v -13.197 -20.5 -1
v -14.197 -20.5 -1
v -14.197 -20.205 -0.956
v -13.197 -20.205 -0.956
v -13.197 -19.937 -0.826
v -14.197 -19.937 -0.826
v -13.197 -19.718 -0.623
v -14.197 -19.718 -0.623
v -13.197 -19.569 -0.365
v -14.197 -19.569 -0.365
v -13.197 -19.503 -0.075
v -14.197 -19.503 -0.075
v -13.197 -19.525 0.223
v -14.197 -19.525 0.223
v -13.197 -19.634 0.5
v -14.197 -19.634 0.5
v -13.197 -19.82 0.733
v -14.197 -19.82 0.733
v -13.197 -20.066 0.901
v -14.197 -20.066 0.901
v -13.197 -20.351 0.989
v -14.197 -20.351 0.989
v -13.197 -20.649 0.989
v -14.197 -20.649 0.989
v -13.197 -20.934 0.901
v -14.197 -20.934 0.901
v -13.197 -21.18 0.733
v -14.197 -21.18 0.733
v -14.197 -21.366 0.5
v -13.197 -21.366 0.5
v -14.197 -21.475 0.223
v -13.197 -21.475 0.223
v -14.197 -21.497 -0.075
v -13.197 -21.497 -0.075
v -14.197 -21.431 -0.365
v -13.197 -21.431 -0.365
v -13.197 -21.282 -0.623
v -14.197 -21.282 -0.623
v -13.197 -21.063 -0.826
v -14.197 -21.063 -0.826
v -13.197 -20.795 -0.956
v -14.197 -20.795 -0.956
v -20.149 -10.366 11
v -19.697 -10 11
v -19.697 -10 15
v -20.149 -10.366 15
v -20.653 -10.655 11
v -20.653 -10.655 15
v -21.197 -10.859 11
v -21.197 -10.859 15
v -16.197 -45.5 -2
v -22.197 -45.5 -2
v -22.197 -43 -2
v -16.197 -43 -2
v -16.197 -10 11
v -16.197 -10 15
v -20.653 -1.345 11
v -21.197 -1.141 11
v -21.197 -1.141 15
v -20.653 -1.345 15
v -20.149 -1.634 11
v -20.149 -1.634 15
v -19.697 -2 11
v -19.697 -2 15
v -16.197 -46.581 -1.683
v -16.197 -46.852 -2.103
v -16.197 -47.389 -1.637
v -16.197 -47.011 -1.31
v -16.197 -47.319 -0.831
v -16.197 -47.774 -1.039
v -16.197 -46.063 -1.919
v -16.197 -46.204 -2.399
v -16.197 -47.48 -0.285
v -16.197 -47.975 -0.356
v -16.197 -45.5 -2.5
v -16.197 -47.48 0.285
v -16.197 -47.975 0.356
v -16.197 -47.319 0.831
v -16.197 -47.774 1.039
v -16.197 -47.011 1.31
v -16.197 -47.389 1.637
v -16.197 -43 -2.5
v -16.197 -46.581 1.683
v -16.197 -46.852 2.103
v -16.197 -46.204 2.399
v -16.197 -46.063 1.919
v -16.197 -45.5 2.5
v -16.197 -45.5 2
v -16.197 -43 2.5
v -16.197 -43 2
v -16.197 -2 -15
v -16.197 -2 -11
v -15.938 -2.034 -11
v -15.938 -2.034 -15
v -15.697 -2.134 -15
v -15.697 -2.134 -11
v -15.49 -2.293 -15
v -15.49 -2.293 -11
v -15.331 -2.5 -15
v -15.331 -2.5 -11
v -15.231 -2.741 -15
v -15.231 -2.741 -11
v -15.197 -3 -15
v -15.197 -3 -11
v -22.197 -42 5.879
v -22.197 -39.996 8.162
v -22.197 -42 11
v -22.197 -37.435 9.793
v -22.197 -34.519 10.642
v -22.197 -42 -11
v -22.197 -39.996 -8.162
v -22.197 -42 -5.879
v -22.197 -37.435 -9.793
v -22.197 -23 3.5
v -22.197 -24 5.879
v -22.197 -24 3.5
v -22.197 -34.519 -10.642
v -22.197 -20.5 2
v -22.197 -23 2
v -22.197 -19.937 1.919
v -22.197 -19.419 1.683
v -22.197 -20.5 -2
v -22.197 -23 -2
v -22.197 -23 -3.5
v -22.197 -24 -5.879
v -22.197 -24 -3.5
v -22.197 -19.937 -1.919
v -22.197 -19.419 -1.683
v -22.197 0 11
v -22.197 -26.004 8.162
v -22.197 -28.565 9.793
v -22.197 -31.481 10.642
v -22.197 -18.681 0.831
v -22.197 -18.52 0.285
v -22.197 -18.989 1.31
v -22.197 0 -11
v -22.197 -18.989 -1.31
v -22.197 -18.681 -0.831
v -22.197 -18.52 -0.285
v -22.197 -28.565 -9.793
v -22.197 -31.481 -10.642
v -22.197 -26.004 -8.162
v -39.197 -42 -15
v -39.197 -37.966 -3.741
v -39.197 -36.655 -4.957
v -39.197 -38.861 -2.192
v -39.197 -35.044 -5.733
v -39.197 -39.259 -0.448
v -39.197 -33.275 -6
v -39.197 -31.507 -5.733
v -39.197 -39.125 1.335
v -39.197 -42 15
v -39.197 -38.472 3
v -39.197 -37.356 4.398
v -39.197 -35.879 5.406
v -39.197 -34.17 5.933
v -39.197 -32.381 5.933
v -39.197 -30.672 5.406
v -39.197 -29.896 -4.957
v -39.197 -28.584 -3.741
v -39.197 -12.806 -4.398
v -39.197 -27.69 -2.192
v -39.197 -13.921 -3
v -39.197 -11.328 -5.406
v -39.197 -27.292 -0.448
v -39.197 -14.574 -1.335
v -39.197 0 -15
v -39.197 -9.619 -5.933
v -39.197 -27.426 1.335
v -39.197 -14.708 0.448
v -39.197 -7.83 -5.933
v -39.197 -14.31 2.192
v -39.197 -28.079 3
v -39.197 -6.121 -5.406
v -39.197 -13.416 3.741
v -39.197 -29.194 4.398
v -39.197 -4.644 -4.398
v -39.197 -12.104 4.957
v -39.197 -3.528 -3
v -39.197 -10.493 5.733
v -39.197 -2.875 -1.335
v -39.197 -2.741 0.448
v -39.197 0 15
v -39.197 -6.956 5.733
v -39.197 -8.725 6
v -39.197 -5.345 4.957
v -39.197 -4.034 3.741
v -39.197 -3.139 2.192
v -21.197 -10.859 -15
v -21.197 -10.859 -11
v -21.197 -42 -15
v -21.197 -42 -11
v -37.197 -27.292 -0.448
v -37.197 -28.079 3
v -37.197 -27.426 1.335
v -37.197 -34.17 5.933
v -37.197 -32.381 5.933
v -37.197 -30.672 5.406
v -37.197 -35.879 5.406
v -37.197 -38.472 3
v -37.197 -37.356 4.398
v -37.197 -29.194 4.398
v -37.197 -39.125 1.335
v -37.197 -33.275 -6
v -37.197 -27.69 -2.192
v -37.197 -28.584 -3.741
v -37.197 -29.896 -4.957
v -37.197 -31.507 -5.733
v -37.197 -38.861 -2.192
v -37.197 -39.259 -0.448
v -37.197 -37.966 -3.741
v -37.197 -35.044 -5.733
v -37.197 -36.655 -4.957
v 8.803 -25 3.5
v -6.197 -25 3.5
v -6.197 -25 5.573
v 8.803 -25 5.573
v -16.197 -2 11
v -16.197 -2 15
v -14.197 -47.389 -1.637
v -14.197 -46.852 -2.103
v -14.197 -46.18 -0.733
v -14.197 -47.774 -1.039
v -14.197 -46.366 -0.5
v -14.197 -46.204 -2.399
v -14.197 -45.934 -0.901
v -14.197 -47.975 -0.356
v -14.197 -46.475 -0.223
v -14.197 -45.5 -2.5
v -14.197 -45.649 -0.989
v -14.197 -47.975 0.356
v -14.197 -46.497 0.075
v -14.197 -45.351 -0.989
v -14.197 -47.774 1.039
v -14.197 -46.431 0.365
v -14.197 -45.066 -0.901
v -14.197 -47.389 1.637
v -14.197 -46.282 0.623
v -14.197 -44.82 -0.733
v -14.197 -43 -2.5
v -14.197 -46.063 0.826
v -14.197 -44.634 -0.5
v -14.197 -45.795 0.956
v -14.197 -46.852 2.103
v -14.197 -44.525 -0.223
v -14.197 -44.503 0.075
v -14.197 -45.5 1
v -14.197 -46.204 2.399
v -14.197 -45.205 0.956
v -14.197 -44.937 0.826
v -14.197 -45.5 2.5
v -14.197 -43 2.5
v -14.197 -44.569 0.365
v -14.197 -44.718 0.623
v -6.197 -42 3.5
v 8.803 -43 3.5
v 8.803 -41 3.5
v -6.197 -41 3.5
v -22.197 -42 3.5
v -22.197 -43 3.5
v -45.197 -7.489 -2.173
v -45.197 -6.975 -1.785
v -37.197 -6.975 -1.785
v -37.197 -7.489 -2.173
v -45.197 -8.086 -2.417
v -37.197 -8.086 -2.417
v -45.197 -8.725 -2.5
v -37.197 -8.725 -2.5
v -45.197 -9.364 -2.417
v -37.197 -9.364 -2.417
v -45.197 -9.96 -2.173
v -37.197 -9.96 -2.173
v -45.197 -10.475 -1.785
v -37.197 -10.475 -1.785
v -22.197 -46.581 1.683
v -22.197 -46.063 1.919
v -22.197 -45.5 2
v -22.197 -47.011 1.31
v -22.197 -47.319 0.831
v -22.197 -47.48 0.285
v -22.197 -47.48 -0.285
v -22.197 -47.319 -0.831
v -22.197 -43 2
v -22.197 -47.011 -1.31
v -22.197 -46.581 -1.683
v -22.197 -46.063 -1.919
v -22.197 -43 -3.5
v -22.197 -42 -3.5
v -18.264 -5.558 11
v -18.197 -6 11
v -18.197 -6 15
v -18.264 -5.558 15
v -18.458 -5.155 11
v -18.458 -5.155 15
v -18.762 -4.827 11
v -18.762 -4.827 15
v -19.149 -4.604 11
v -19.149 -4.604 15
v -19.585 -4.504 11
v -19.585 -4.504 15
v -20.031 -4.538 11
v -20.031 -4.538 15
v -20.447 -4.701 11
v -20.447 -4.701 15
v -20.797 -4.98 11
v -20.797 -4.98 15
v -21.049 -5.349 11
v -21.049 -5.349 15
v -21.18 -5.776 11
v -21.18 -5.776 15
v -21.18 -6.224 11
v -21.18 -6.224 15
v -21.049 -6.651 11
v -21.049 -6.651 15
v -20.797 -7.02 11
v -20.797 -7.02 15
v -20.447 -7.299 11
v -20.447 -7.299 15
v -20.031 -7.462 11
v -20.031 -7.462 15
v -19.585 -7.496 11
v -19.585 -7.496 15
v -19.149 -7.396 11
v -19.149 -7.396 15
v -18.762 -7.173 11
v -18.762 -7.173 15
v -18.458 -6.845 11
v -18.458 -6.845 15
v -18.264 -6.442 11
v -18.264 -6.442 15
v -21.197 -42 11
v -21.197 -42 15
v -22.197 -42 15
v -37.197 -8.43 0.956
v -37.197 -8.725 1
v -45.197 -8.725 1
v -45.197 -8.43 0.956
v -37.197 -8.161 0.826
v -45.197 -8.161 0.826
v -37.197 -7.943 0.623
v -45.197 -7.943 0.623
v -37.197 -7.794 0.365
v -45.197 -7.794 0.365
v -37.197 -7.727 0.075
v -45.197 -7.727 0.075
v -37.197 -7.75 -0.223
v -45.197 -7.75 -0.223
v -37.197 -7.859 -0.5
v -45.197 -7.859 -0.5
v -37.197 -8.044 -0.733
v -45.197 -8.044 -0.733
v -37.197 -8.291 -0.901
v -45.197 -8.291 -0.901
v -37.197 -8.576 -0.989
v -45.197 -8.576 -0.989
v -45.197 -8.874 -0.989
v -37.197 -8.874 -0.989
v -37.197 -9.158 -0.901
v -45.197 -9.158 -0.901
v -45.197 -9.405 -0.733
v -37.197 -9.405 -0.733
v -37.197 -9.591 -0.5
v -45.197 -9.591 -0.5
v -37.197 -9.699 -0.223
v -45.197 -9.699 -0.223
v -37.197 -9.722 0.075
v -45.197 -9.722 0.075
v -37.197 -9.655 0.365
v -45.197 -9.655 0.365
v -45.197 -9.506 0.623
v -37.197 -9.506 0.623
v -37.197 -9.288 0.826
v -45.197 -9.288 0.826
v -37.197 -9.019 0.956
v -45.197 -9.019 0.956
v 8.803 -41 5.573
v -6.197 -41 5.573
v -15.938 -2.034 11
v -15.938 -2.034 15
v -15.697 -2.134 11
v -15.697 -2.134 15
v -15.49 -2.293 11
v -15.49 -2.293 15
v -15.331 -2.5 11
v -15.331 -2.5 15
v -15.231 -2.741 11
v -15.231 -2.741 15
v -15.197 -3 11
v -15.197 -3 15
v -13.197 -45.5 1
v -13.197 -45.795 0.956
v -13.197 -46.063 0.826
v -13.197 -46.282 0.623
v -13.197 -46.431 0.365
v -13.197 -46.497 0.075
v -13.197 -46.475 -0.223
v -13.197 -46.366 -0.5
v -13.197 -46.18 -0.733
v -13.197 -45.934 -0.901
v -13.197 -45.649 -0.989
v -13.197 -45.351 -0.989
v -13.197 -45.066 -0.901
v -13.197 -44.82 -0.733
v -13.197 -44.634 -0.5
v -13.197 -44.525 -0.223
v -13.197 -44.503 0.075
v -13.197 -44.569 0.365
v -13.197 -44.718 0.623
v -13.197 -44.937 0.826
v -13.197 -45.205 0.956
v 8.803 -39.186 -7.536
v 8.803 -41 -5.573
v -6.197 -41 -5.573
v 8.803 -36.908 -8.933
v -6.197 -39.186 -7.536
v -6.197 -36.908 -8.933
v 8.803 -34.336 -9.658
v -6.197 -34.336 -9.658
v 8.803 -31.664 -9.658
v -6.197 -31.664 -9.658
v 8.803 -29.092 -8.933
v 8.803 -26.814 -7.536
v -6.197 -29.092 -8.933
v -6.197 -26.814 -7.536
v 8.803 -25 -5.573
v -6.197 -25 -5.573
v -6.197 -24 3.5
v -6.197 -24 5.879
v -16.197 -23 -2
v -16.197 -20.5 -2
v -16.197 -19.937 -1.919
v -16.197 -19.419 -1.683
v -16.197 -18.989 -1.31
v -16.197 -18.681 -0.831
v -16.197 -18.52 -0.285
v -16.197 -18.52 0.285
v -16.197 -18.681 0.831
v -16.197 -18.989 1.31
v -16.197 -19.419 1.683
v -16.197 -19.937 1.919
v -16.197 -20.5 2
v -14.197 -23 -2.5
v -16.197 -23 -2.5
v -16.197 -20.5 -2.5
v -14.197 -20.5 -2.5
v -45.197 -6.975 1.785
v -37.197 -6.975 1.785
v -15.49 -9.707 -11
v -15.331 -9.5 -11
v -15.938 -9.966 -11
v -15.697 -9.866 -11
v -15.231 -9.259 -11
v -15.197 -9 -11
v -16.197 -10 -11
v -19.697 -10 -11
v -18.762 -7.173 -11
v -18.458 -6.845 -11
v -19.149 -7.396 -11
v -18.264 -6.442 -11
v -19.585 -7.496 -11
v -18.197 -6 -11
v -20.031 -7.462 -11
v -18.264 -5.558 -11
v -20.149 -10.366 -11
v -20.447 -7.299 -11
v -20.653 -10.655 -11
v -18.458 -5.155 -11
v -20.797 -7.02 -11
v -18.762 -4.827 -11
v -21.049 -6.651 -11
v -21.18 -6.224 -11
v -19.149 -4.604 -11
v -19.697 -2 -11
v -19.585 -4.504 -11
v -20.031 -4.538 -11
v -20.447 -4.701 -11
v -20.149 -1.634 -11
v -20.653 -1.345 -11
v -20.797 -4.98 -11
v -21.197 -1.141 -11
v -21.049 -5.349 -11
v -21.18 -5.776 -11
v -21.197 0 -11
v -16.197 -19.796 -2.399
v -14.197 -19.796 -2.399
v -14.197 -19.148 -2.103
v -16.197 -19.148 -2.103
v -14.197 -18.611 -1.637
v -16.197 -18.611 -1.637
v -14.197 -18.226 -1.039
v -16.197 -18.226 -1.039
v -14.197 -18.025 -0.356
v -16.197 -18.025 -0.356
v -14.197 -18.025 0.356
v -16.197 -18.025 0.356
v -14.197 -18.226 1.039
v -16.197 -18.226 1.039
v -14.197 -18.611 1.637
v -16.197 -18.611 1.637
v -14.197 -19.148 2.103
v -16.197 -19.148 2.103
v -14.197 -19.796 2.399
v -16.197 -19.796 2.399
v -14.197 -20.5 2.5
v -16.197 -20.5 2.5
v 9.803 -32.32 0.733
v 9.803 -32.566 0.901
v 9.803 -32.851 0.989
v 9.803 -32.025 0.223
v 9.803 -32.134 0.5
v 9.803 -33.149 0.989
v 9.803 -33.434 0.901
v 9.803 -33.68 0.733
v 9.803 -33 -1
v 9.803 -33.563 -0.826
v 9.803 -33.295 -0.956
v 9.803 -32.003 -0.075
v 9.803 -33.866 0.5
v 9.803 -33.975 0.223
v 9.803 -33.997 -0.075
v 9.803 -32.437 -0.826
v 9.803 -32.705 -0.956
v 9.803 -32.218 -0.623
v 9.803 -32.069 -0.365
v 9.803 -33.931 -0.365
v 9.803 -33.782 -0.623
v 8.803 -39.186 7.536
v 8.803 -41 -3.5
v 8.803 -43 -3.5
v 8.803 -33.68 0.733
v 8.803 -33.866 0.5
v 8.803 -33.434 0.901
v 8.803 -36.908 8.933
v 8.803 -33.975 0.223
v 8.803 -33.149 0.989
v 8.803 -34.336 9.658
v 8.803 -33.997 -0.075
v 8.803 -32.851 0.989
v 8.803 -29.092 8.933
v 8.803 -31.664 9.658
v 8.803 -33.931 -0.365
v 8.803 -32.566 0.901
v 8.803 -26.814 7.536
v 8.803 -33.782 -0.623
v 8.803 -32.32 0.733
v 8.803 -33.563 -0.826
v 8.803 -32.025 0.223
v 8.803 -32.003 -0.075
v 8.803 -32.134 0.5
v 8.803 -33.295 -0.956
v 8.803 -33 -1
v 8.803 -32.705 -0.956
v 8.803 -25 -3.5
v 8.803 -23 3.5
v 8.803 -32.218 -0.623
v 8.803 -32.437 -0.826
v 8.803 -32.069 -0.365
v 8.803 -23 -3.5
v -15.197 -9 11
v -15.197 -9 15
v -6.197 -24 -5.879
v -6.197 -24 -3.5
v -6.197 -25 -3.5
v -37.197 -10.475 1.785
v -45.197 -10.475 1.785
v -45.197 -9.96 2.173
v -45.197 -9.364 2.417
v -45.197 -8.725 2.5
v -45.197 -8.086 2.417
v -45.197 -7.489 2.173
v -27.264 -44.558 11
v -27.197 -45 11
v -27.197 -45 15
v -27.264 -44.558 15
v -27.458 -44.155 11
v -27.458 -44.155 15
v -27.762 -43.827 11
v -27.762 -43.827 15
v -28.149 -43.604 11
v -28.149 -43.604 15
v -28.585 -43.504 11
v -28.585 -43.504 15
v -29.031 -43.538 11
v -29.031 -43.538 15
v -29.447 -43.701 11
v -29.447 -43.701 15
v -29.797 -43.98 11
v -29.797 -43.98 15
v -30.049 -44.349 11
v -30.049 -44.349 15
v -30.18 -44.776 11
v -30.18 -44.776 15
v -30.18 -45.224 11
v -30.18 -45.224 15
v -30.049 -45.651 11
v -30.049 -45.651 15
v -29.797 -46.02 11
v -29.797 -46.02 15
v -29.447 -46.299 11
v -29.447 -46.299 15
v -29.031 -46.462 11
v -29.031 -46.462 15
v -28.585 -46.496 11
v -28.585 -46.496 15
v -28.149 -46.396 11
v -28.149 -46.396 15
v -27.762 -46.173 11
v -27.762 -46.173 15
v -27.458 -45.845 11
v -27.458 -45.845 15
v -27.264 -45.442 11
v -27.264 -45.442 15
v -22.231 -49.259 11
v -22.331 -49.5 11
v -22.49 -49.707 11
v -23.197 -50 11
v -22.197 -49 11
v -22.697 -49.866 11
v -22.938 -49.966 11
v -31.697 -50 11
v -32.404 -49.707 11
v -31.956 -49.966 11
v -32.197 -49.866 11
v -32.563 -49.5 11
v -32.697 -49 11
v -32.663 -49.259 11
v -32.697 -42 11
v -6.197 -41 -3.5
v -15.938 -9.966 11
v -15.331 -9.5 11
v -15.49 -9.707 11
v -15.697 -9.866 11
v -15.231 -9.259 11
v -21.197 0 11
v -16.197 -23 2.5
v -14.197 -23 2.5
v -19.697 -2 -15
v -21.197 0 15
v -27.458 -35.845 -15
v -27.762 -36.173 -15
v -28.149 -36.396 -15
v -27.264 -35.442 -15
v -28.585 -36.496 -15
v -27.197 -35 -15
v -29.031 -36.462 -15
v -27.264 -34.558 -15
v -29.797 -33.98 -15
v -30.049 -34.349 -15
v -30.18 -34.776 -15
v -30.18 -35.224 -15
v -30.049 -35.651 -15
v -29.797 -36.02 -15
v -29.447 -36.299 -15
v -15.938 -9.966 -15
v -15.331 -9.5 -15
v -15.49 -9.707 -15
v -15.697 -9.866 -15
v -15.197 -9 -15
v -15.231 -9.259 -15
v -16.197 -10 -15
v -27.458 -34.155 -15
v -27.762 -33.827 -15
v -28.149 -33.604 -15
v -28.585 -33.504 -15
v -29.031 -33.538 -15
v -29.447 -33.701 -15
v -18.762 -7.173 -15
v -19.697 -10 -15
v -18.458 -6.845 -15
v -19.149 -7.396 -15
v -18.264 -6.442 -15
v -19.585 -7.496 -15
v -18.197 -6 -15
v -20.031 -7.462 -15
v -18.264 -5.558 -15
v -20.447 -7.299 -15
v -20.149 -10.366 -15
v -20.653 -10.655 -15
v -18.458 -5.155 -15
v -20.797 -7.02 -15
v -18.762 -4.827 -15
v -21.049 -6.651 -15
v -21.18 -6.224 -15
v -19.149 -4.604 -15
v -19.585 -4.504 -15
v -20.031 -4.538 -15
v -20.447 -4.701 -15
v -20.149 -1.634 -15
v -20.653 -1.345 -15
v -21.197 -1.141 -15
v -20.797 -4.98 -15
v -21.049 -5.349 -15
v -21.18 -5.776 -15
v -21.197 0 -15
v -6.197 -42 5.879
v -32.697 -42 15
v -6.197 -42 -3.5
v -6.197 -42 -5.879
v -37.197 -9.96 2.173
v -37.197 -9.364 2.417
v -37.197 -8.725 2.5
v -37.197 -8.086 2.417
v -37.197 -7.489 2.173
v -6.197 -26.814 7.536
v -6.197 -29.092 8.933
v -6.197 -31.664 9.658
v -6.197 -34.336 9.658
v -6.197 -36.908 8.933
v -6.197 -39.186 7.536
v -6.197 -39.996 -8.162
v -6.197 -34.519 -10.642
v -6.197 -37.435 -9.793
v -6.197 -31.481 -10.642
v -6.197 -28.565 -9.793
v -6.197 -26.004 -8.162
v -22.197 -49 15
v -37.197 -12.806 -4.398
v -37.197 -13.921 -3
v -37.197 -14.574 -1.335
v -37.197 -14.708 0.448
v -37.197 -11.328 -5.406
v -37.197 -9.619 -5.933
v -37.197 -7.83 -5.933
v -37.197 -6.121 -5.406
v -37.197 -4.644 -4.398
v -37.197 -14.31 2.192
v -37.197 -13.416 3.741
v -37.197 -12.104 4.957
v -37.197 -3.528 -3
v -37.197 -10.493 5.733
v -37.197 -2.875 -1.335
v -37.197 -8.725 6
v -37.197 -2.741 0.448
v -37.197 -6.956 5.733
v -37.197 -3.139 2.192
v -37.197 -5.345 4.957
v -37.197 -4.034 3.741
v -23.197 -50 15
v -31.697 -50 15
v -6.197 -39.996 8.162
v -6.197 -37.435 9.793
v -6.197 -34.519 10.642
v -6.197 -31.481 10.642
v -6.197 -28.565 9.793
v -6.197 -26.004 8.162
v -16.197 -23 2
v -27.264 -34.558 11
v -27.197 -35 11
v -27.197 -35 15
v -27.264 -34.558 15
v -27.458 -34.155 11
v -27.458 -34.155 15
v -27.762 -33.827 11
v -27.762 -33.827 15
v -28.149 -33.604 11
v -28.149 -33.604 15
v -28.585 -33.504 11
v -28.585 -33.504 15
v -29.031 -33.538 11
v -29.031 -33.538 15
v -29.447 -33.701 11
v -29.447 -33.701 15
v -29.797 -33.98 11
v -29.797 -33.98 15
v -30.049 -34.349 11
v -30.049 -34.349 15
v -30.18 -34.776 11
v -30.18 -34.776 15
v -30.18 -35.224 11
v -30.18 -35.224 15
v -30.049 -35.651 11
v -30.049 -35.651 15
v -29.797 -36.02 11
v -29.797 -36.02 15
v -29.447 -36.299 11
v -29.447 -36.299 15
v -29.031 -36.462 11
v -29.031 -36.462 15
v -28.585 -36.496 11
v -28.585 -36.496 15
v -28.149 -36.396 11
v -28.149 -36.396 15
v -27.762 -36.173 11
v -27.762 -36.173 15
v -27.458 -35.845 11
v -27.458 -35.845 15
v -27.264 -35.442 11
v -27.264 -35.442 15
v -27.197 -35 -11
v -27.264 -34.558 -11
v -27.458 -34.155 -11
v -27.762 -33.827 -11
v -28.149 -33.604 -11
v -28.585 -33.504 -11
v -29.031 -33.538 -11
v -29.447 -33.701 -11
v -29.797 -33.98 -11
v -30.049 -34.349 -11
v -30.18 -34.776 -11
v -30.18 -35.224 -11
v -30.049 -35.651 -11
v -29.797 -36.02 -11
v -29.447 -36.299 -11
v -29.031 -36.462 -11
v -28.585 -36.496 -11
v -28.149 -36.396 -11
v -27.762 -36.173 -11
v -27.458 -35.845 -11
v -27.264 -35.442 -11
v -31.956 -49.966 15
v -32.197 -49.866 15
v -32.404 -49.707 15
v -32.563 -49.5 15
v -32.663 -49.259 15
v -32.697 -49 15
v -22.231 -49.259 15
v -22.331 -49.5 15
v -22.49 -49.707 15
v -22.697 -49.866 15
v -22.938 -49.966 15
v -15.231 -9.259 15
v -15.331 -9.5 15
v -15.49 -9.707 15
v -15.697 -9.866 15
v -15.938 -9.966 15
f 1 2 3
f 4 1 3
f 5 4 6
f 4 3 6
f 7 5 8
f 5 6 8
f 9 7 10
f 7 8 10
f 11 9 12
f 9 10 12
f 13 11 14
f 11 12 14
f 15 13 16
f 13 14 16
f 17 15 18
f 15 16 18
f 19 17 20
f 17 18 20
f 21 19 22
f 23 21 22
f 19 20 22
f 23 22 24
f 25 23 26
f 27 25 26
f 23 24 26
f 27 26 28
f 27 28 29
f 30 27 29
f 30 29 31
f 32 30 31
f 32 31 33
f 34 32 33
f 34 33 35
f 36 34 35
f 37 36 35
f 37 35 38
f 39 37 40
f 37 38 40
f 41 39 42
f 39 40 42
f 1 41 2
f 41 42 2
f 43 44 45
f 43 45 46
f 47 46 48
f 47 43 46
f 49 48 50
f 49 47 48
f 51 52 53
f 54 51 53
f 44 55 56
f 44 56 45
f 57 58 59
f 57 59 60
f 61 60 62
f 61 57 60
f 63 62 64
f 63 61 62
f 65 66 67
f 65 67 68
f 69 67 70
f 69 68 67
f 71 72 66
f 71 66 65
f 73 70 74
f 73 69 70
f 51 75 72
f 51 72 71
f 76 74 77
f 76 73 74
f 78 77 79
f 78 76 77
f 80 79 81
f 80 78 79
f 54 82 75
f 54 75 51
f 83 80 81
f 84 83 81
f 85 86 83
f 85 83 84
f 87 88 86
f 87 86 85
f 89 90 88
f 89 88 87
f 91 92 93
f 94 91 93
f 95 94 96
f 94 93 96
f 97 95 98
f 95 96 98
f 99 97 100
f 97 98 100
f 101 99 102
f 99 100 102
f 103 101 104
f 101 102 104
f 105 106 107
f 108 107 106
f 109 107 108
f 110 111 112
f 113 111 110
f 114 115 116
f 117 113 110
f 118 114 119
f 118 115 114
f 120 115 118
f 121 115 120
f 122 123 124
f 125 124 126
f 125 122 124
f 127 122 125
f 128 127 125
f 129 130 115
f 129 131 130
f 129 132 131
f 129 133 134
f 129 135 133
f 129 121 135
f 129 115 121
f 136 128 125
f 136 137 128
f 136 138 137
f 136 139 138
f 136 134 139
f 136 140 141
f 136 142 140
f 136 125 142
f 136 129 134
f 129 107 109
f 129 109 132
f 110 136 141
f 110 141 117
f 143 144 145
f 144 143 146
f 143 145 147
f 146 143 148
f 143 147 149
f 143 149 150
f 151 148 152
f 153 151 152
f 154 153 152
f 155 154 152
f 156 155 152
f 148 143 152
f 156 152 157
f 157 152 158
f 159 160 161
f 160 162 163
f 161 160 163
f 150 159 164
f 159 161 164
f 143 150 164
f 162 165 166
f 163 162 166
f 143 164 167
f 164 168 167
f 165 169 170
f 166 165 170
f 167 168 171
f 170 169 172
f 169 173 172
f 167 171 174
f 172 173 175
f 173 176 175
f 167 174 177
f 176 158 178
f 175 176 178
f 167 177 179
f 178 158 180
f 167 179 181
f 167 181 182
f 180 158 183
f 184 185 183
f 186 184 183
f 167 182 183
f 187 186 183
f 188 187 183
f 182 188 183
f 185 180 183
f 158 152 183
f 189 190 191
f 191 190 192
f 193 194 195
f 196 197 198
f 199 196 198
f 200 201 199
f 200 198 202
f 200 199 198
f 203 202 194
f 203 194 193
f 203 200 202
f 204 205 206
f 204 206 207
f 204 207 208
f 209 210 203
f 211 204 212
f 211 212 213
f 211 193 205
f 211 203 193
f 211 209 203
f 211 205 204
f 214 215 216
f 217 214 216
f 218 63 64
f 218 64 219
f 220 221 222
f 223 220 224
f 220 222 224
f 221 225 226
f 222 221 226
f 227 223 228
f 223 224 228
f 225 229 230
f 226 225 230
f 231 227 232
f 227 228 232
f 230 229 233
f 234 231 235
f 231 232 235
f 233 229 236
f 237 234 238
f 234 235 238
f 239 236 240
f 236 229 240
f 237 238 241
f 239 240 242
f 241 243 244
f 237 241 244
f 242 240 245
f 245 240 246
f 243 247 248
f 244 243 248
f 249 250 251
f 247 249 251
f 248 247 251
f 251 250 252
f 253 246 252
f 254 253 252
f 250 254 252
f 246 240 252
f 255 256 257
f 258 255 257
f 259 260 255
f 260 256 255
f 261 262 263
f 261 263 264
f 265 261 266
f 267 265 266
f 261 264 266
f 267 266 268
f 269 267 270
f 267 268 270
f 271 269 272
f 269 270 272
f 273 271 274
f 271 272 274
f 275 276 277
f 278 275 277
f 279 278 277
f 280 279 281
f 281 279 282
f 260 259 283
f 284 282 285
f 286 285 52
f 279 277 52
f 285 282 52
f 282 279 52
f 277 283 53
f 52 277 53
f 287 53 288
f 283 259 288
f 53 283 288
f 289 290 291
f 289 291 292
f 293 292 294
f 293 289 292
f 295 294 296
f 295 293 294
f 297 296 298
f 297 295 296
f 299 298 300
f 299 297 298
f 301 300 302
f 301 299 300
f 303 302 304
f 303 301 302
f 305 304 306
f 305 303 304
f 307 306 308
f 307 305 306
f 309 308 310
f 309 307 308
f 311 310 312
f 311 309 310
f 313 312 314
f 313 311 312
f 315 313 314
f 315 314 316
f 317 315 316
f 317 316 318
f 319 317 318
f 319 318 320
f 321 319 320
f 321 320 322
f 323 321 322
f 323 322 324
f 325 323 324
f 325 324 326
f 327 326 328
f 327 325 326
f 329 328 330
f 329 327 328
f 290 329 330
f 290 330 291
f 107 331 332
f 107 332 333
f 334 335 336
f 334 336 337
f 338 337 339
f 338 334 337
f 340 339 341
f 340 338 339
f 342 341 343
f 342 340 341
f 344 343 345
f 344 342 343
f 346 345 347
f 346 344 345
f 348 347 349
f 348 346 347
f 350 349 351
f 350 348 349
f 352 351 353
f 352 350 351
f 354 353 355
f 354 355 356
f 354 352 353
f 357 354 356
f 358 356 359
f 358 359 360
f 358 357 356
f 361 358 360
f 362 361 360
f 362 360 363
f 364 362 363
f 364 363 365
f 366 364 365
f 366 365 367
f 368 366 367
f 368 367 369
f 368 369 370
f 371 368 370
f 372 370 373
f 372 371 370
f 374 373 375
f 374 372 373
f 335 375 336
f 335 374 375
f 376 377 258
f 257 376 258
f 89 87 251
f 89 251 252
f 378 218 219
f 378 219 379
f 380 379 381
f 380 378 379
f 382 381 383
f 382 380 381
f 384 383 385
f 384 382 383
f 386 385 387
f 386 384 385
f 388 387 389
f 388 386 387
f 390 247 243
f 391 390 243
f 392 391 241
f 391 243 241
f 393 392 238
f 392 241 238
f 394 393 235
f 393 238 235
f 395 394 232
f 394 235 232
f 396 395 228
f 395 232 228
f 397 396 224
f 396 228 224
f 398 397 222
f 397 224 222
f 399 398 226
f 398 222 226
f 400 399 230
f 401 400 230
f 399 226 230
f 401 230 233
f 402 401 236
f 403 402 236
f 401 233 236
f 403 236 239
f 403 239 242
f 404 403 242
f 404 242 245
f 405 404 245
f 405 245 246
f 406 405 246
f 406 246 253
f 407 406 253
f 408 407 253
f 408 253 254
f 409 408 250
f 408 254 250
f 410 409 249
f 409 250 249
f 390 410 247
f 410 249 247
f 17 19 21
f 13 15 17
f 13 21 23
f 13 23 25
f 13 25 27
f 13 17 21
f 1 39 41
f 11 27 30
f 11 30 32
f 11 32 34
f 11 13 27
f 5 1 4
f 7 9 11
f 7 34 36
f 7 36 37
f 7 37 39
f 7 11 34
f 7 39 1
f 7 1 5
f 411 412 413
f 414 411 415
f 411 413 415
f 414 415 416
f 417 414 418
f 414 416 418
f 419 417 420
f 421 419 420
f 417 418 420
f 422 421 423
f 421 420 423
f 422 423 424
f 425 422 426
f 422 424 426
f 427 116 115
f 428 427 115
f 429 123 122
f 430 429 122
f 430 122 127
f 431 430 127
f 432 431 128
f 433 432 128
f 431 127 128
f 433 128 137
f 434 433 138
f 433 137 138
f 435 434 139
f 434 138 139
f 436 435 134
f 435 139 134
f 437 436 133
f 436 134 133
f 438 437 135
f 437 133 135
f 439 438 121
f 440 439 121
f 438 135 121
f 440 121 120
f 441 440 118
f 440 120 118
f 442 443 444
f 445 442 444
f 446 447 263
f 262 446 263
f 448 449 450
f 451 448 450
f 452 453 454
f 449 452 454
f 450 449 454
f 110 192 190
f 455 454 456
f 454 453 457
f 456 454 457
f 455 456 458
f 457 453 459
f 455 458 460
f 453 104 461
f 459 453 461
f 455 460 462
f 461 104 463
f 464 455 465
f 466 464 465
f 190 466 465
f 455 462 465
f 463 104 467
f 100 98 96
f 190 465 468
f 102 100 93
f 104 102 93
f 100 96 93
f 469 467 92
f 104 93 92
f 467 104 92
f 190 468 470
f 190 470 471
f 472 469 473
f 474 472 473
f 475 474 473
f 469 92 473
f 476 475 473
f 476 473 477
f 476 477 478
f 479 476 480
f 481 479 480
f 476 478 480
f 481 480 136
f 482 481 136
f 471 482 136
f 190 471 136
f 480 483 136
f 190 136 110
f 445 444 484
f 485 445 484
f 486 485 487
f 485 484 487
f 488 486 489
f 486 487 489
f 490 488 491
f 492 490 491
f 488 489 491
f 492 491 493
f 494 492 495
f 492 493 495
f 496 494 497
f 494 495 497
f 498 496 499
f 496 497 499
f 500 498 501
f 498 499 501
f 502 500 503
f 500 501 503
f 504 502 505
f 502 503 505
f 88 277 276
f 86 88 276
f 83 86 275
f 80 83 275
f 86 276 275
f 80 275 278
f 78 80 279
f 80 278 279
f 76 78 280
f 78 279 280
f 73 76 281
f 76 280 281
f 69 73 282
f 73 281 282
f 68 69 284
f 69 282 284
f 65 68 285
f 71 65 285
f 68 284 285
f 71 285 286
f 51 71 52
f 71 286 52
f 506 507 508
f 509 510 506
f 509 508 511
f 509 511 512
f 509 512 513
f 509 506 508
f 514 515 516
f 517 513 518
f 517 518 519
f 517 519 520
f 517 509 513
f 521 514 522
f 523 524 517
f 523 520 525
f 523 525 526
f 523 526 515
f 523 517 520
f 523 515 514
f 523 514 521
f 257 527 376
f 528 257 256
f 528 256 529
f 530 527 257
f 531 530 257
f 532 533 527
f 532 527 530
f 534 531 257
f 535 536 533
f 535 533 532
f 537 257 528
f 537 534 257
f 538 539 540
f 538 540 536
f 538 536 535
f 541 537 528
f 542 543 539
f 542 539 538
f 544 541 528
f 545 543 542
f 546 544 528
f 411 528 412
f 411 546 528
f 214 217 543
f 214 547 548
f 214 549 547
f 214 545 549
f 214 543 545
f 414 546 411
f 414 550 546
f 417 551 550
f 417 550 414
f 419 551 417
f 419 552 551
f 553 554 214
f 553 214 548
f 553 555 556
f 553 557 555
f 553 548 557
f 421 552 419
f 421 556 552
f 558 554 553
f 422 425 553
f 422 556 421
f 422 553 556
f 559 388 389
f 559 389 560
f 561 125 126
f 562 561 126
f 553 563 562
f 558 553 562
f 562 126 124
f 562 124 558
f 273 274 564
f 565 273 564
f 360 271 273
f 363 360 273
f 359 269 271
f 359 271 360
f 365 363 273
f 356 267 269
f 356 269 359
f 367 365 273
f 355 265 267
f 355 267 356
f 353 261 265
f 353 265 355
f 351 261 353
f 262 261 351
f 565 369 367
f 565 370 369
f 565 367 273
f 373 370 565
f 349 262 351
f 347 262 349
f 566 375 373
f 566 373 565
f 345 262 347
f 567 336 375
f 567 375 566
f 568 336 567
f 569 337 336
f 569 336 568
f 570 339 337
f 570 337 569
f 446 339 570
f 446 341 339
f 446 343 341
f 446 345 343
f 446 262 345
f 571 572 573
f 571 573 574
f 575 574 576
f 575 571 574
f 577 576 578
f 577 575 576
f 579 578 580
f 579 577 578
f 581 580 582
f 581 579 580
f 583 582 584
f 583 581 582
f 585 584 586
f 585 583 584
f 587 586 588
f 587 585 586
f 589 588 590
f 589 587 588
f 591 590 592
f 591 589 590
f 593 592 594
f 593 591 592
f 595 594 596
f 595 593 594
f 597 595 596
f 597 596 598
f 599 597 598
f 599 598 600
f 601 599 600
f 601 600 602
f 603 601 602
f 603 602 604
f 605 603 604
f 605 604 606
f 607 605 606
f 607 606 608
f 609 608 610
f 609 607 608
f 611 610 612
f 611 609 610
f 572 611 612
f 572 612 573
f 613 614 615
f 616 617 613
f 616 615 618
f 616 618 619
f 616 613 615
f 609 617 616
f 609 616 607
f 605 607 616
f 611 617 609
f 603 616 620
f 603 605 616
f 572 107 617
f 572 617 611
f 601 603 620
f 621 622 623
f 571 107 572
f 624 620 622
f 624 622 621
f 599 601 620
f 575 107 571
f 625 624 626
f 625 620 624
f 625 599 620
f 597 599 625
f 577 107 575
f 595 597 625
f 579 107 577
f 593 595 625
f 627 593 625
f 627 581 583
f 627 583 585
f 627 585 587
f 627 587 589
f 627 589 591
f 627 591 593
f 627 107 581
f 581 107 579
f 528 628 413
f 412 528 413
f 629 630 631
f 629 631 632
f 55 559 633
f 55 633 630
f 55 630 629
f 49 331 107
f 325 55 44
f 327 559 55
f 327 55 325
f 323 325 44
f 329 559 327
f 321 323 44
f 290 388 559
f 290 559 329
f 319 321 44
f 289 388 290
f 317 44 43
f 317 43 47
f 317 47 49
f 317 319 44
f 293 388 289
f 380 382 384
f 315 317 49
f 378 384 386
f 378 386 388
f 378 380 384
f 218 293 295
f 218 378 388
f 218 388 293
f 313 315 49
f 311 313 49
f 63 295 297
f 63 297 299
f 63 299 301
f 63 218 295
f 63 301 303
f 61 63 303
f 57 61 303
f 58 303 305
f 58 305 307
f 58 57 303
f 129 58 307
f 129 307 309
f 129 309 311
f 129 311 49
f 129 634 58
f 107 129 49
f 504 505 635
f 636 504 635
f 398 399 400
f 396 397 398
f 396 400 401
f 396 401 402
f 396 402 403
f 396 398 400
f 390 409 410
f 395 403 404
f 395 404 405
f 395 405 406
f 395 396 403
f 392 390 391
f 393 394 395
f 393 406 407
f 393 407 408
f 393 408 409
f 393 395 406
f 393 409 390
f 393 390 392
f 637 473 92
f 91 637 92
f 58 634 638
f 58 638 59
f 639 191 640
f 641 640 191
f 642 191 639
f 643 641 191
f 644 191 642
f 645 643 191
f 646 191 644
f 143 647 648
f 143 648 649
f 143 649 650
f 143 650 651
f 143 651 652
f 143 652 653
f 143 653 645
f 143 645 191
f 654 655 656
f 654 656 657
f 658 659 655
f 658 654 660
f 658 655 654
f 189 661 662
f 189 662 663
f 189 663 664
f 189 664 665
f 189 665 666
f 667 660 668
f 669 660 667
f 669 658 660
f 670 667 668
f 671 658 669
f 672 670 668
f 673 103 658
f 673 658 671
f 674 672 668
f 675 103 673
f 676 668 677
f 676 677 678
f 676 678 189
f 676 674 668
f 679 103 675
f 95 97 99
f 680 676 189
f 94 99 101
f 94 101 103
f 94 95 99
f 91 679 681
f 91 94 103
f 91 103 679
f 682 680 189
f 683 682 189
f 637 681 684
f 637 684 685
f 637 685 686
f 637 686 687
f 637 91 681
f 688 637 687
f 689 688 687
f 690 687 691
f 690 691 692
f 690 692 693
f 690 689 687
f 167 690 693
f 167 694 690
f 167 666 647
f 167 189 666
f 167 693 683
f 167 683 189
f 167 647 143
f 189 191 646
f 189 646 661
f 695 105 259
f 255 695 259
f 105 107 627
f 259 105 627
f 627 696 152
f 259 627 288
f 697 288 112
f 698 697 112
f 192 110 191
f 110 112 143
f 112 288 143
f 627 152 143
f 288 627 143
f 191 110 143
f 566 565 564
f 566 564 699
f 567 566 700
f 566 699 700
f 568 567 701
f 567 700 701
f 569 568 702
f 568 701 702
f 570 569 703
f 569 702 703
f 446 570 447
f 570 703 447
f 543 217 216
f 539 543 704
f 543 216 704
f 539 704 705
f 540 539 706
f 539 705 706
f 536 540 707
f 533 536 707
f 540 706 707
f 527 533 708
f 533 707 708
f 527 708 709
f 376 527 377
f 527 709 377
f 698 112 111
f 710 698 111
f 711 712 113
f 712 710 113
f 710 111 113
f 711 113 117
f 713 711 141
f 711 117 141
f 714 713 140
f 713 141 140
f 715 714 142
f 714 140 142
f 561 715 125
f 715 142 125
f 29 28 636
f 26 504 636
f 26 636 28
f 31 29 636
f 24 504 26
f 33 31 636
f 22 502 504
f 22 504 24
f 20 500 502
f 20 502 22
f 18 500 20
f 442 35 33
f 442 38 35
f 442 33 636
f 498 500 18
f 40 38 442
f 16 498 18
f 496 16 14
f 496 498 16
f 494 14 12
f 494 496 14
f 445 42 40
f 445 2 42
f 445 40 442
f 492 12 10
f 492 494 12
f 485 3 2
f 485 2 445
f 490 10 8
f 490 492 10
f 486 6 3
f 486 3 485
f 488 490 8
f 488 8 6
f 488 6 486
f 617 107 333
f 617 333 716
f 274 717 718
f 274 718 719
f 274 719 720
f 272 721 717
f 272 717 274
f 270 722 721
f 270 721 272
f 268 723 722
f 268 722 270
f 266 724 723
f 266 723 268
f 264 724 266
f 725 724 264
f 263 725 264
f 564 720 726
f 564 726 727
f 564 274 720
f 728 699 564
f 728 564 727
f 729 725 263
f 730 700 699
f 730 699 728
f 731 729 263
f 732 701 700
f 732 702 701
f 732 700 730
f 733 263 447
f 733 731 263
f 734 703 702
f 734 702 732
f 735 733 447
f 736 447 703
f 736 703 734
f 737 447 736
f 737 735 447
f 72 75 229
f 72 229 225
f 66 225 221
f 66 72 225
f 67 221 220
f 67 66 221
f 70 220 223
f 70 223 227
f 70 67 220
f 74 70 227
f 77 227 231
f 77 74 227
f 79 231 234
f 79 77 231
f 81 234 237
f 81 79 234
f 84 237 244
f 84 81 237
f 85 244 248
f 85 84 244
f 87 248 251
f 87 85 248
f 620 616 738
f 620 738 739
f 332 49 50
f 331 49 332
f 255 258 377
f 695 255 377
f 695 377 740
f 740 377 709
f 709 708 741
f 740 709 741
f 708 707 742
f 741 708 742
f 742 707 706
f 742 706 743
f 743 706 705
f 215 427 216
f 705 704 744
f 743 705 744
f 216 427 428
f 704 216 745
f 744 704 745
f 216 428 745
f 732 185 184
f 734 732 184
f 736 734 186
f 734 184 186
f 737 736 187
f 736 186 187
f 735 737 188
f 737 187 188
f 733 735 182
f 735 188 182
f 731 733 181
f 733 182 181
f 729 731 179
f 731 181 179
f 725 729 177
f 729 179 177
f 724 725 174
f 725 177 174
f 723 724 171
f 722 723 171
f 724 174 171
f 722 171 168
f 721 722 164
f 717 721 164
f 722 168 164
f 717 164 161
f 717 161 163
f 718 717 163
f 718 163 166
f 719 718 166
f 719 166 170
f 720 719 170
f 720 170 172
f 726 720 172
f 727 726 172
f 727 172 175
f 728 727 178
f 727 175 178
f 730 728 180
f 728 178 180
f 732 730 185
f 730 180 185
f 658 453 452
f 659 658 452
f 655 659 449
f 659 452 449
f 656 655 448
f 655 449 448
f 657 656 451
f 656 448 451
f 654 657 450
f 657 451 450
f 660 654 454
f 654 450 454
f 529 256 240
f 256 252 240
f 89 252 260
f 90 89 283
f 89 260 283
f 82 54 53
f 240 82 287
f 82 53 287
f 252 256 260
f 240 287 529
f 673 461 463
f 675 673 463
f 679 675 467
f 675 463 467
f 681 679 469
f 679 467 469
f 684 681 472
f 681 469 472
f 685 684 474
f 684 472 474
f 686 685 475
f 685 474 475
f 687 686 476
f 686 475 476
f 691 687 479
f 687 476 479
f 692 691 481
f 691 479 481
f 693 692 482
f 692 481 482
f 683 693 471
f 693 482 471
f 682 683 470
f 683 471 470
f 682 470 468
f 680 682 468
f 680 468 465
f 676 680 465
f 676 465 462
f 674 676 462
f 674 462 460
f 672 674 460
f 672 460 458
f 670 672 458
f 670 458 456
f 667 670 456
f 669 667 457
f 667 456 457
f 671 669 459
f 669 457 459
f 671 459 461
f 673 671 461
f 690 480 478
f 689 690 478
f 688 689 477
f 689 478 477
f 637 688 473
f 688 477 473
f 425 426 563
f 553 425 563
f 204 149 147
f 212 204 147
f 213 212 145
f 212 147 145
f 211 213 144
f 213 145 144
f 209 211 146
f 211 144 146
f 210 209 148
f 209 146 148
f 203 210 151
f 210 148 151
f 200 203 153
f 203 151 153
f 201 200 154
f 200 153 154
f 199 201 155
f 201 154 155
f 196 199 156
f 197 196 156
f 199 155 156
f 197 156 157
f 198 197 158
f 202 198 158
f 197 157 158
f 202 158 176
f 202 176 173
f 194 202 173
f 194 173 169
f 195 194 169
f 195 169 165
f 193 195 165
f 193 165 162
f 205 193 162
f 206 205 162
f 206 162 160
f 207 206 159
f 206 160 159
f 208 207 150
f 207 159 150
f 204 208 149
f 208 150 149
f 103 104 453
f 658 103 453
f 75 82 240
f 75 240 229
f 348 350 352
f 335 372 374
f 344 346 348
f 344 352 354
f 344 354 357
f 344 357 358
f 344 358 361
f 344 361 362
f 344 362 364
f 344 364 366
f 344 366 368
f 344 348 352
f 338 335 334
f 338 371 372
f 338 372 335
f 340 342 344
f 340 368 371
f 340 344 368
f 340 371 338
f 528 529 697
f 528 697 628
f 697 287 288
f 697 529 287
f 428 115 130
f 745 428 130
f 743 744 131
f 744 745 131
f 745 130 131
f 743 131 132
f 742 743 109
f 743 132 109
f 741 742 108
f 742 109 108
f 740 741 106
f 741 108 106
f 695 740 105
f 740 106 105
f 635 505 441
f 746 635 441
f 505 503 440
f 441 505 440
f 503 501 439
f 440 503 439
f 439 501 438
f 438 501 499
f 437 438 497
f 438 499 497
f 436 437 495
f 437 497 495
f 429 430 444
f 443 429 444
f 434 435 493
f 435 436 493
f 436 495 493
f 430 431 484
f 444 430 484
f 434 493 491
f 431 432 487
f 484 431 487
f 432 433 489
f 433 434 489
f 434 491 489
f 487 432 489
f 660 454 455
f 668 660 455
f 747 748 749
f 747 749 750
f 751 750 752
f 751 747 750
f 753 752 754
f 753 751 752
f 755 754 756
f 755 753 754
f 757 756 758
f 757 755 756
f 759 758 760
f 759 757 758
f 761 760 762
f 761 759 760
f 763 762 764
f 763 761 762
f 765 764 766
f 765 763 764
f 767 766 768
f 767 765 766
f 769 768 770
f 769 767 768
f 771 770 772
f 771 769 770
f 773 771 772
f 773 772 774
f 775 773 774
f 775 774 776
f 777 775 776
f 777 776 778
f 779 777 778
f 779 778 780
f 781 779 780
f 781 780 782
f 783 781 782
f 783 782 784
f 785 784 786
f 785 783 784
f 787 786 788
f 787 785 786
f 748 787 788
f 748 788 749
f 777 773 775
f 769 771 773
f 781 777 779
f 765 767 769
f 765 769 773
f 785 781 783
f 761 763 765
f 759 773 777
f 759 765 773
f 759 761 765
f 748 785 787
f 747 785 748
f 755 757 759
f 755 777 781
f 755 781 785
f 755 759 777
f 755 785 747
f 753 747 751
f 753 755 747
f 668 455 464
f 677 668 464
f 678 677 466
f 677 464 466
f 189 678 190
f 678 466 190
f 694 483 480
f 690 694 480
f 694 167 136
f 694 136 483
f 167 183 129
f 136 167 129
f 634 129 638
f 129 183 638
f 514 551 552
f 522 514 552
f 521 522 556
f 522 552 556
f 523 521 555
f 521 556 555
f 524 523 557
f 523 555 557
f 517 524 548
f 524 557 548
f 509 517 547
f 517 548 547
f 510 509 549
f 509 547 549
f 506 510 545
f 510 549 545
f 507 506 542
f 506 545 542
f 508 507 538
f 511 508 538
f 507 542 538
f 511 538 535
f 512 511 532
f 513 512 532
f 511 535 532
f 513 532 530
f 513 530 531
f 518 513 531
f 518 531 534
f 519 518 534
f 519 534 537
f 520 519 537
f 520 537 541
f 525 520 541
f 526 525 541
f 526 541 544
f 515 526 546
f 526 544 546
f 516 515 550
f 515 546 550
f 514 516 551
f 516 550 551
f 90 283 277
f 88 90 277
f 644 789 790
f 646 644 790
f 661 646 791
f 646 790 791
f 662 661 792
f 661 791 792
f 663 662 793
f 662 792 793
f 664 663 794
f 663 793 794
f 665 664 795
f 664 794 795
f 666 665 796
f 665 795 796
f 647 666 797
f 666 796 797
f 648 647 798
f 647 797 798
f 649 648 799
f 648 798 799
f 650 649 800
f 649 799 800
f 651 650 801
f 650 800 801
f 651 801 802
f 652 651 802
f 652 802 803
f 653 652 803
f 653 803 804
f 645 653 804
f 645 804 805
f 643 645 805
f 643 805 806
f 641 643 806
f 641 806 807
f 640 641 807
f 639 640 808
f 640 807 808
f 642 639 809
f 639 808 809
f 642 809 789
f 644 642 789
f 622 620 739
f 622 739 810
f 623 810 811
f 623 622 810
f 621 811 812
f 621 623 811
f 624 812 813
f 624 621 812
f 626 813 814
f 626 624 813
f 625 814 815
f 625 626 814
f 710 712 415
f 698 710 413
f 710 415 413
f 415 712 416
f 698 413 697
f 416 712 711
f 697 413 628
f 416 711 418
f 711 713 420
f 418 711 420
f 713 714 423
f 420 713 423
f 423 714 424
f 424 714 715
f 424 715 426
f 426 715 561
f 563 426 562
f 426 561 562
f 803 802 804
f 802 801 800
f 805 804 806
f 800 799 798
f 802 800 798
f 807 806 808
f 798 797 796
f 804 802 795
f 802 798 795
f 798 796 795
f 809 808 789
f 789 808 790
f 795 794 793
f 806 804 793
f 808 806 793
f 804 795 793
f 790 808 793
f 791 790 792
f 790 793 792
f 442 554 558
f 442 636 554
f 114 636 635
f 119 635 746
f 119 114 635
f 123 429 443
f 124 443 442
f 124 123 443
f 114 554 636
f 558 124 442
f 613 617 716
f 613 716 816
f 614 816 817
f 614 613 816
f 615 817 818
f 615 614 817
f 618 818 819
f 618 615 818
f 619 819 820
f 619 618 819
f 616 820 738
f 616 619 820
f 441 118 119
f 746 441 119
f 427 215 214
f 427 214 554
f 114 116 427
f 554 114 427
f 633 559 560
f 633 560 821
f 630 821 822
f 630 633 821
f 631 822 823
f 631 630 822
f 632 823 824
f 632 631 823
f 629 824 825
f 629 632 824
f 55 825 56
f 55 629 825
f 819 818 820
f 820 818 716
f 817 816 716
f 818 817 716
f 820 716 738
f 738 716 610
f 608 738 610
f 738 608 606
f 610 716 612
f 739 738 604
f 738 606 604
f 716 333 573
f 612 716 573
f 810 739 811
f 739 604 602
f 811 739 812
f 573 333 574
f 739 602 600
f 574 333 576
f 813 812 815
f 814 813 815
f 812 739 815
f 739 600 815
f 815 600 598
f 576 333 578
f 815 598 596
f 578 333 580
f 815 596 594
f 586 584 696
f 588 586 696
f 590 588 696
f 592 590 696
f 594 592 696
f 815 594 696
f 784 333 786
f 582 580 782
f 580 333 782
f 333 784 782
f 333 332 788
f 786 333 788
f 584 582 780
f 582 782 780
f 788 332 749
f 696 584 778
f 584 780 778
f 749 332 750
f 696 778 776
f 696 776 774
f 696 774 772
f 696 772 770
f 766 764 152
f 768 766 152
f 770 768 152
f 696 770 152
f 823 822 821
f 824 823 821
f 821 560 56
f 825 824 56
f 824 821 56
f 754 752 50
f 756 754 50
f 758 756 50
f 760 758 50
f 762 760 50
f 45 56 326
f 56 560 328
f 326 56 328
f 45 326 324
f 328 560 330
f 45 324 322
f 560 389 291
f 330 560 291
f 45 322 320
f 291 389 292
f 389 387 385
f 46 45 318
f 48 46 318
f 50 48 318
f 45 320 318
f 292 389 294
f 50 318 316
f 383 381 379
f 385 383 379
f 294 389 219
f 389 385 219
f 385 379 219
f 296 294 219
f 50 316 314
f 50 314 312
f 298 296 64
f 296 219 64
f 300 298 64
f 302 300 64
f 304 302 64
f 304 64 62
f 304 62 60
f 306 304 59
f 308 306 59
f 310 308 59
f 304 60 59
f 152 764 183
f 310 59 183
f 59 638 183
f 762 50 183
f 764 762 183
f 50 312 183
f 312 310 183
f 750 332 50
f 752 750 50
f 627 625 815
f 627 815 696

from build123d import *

# Parameters (mm, degrees)
ESQUISSE2_W             = 17
ESQUISSE2_H             = 22
BASE_DEPTH              = 42
ESQUISSE3_R             = 6
VIDE_CERCLE_DEPTH       = 2
ESQUISSE4_R             = 1
AXE_ROUE_DEPTH          = 8
ESQUISSE6_R             = 1.5
COTE_DEPTH              = 4
ESQUISSE7_W             = 10.5
ESQUISSE7_H             = 8
AJUSTE_COTE_DEPTH       = 4
ESQUISSE8_W             = 7
ESQUISSE8_H             = 1
BLOC_MOTEUR_DEPTH       = 31
VODE_START              = -15
VODE_MOTEUR_DEPTH       = 15
ESQUISSE11_R            = 1
SORTIE_AXE_MOTEUR_DEPTH = 1
VIS_MOTEUR_1_DEPTH      = 6
VIS_MOTEUR_2_DEPTH      = 2
ESQUISSE15_R            = 1
VIS_MOTEUR_3_DEPTH      = 1


with BuildPart() as part:
    # Esquisse2 → Base (new body)
    with BuildSketch(Plane(origin=(0, 0, 0), x_dir=(1, 0, 0), z_dir=(0, 1, 0))):
        with Locations((-30.697167752, 0)):
            Rectangle(ESQUISSE2_W, ESQUISSE2_H)
    extrude(amount=-BASE_DEPTH)

    # Esquisse3 → VIDE CERCLE (cut)
    with BuildSketch(Plane.ZY.offset(39.197167752)):
        with Locations((0, -8.724551396)):
            Circle(ESQUISSE3_R)
        with Locations(Location((0, -33.275448604, 0), (0, 0, 180))):
            Circle(ESQUISSE3_R)
    extrude(amount=-VIDE_CERCLE_DEPTH, mode=Mode.SUBTRACT)

    # Esquisse4 → AXE ROUE (add)
    with BuildSketch(Plane.ZY.offset(37.197167752)):
        with BuildLine():
            Line((1.785357107, -6.974551396), (-1.785357107, -6.974551396))
            ThreePointArc((-1.785357107, -6.974551396), (-2.5, -8.724551396), (-1.785357107, -10.474551396))
            Line((-1.785357107, -10.474551396), (1.785357107, -10.474551396))
            ThreePointArc((1.785357107, -10.474551396), (2.5, -8.724551396), (1.785357107, -6.974551396))
        make_face()
        with Locations((0, -8.724551396)):
            Circle(ESQUISSE4_R, mode=Mode.SUBTRACT)
    extrude(amount=AXE_ROUE_DEPTH)

    # Esquisse6 → COTE (add)
    with BuildSketch(Plane.XY.offset(11)):
        with BuildLine():
            Line((-19.697167752, -2), (-16.197167752, -2))
            ThreePointArc((-16.197167752, -2), (-15.490060971, -2.292893219), (-15.197167752, -3))
            Line((-15.197167752, -3), (-15.197167752, -9))
            ThreePointArc((-15.197167752, -9), (-15.490060971, -9.707106781), (-16.197167752, -10))
            Line((-16.197167752, -10), (-19.697167752, -10))
            ThreePointArc((-19.697167752, -10), (-20.395192088, -10.520394841), (-21.197167752, -10.859339966))
            Line((-21.197167752, -10.859339966), (-21.197167752, -42))
            Line((-21.197167752, -42), (-22.197167752, -42))
            Line((-22.197167752, -42), (-22.197167752, -49))
            ThreePointArc((-22.197167752, -49), (-22.490060971, -49.707106781), (-23.197167752, -50))
            Line((-23.197167752, -50), (-31.697167752, -50))
            ThreePointArc((-31.697167752, -50), (-32.404274533, -49.707106781), (-32.697167752, -49))
            Line((-32.697167752, -49), (-32.697167752, -42))
            Line((-32.697167752, -42), (-39.197167752, -42))
            Line((-39.197167752, -42), (-39.197167752, 0))
            Line((-39.197167752, 0), (-22.197167752, 0))
            Line((-22.197167752, 0), (-21.197167752, 0))
            Line((-21.197167752, 0), (-21.197167752, -1.140660034))
            ThreePointArc((-21.197167752, -1.140660034), (-20.395192088, -1.479605159), (-19.697167752, -2))
        make_face()
        with Locations((-19.697167752, -6)):
            Circle(ESQUISSE6_R, mode=Mode.SUBTRACT)
        with Locations((-28.697167752, -35)):
            Circle(ESQUISSE6_R, mode=Mode.SUBTRACT)
        with Locations((-28.697167752, -45)):
            Circle(ESQUISSE6_R, mode=Mode.SUBTRACT)
    cote = extrude(amount=COTE_DEPTH)

    # SYM COTE: COTE across plane
    add(cote.mirror(Plane.XY))

    # Esquisse7 → AJUSTE COTE (cut)
    with BuildSketch(Plane.XY.offset(-11)):
        with Locations((-27.447167752, -46)):
            Rectangle(ESQUISSE7_W, ESQUISSE7_H)
    extrude(amount=-AJUSTE_COTE_DEPTH, mode=Mode.SUBTRACT)

    # Esquisse8 → BLOC MOTEUR (add)
    with BuildSketch(Plane(origin=(-22.197167752, 0, 0), x_dir=(0, 0, -1), z_dir=(1, 0, 0))):
        with BuildLine():
            ThreePointArc((-5.878988008, -24), (-10.75, -33), (-5.878988008, -42))
            Line((-5.878988008, -42), (-3.5, -42))
            Line((-3.5, -42), (3.5, -42))
            Line((3.5, -42), (5.878988008, -42))
            ThreePointArc((5.878988008, -42), (10.75, -33), (5.878988008, -24))
            Line((5.878988008, -24), (3.5, -24))
            Line((3.5, -24), (-3.5, -24))
            Line((-3.5, -24), (-5.878988008, -24))
        make_face()
        with Locations((0, -42.5)):
            Rectangle(ESQUISSE8_W, ESQUISSE8_H)
        with Locations((0, -23.5)):
            Rectangle(ESQUISSE8_W, ESQUISSE8_H)
    extrude(amount=BLOC_MOTEUR_DEPTH)

    # Esquisse10 → VODE MOTEUR (cut)
    with BuildSketch(Plane(origin=(8.802832248, 0, 0), x_dir=(0, 0, -1), z_dir=(1, 0, 0)).offset(VODE_START)):
        with BuildLine():
            Line((-5.878988008, -24), (-3.5, -24))
            Line((-3.5, -24), (-3.5, -25))
            Line((-3.5, -25), (-5.573374202, -25))
            ThreePointArc((-5.573374202, -25), (-9.75, -33), (-5.573374202, -41))
            Line((-5.573374202, -41), (-3.5, -41))
            Line((-3.5, -41), (-3.5, -42))
            Line((-3.5, -42), (-5.878988008, -42))
            ThreePointArc((-5.878988008, -42), (-10.75, -33), (-5.878988008, -24))
        make_face()
        with BuildLine():
            Line((3.5, -24), (5.878988008, -24))
            ThreePointArc((5.878988008, -24), (10.75, -33), (5.878988008, -42))
            Line((5.878988008, -42), (3.5, -42))
            Line((3.5, -42), (3.5, -41))
            Line((3.5, -41), (5.573374202, -41))
            ThreePointArc((5.573374202, -41), (9.75, -33), (5.573374202, -25))
            Line((5.573374202, -25), (3.5, -25))
            Line((3.5, -25), (3.5, -24))
        make_face()
    extrude(amount=VODE_MOTEUR_DEPTH, mode=Mode.SUBTRACT)

    # Esquisse11 → SORTIE AXE MOTEUR (add)
    with BuildSketch(Plane(origin=(8.802832248, 0, 0), x_dir=(0, 0, -1), z_dir=(1, 0, 0))):
        with Locations((0, -33)):
            Circle(ESQUISSE11_R)
    extrude(amount=SORTIE_AXE_MOTEUR_DEPTH)

    # Esquisse12 → VIS MOTEUR 1 (add)
    with BuildSketch(Plane(origin=(-22.197167752, 0, 0), x_dir=(0, 0, -1), z_dir=(1, 0, 0))):
        with BuildLine():
            Line((-2, -20.5), (-2, -23))
            Line((-2, -23), (2, -23))
            Line((2, -23), (2, -20.5))
            ThreePointArc((2, -20.5), (0, -18.5), (-2, -20.5))
        make_face()
        with BuildLine():
            Line((2, -45.5), (2, -43))
            Line((2, -43), (-2, -43))
            Line((-2, -43), (-2, -45.5))
            ThreePointArc((-2, -45.5), (0, -47.5), (2, -45.5))
        make_face()
    extrude(amount=VIS_MOTEUR_1_DEPTH)

    # Esquisse14 → VIS MOTEUR 2 (add)
    with BuildSketch(Plane(origin=(-16.197167752, 0, 0), x_dir=(0, 0, -1), z_dir=(1, 0, 0))):
        with BuildLine():
            Line((-2.5, -20.5), (-2.5, -23))
            Line((-2.5, -23), (2.5, -23))
            Line((2.5, -23), (2.5, -20.5))
            ThreePointArc((2.5, -20.5), (0, -18), (-2.5, -20.5))
        make_face()
        with BuildLine():
            Line((-2.5, -43), (2.5, -43))
            Line((2.5, -43), (2.5, -45.5))
            ThreePointArc((2.5, -45.5), (0, -48), (-2.5, -45.5))
            Line((-2.5, -45.5), (-2.5, -43))
        make_face()
    extrude(amount=VIS_MOTEUR_2_DEPTH)

    # Esquisse15 → VIS MOTEUR 3 (add)
    with BuildSketch(Plane(origin=(-14.197167752, 0, 0), x_dir=(0, 0, -1), z_dir=(1, 0, 0))):
        with Locations((0, -20.5)):
            Circle(ESQUISSE15_R)
        with Locations(Location((0, -45.5, 0), (0, 0, 180))):
            Circle(ESQUISSE15_R)
    extrude(amount=VIS_MOTEUR_3_DEPTH)


solid = part.part
